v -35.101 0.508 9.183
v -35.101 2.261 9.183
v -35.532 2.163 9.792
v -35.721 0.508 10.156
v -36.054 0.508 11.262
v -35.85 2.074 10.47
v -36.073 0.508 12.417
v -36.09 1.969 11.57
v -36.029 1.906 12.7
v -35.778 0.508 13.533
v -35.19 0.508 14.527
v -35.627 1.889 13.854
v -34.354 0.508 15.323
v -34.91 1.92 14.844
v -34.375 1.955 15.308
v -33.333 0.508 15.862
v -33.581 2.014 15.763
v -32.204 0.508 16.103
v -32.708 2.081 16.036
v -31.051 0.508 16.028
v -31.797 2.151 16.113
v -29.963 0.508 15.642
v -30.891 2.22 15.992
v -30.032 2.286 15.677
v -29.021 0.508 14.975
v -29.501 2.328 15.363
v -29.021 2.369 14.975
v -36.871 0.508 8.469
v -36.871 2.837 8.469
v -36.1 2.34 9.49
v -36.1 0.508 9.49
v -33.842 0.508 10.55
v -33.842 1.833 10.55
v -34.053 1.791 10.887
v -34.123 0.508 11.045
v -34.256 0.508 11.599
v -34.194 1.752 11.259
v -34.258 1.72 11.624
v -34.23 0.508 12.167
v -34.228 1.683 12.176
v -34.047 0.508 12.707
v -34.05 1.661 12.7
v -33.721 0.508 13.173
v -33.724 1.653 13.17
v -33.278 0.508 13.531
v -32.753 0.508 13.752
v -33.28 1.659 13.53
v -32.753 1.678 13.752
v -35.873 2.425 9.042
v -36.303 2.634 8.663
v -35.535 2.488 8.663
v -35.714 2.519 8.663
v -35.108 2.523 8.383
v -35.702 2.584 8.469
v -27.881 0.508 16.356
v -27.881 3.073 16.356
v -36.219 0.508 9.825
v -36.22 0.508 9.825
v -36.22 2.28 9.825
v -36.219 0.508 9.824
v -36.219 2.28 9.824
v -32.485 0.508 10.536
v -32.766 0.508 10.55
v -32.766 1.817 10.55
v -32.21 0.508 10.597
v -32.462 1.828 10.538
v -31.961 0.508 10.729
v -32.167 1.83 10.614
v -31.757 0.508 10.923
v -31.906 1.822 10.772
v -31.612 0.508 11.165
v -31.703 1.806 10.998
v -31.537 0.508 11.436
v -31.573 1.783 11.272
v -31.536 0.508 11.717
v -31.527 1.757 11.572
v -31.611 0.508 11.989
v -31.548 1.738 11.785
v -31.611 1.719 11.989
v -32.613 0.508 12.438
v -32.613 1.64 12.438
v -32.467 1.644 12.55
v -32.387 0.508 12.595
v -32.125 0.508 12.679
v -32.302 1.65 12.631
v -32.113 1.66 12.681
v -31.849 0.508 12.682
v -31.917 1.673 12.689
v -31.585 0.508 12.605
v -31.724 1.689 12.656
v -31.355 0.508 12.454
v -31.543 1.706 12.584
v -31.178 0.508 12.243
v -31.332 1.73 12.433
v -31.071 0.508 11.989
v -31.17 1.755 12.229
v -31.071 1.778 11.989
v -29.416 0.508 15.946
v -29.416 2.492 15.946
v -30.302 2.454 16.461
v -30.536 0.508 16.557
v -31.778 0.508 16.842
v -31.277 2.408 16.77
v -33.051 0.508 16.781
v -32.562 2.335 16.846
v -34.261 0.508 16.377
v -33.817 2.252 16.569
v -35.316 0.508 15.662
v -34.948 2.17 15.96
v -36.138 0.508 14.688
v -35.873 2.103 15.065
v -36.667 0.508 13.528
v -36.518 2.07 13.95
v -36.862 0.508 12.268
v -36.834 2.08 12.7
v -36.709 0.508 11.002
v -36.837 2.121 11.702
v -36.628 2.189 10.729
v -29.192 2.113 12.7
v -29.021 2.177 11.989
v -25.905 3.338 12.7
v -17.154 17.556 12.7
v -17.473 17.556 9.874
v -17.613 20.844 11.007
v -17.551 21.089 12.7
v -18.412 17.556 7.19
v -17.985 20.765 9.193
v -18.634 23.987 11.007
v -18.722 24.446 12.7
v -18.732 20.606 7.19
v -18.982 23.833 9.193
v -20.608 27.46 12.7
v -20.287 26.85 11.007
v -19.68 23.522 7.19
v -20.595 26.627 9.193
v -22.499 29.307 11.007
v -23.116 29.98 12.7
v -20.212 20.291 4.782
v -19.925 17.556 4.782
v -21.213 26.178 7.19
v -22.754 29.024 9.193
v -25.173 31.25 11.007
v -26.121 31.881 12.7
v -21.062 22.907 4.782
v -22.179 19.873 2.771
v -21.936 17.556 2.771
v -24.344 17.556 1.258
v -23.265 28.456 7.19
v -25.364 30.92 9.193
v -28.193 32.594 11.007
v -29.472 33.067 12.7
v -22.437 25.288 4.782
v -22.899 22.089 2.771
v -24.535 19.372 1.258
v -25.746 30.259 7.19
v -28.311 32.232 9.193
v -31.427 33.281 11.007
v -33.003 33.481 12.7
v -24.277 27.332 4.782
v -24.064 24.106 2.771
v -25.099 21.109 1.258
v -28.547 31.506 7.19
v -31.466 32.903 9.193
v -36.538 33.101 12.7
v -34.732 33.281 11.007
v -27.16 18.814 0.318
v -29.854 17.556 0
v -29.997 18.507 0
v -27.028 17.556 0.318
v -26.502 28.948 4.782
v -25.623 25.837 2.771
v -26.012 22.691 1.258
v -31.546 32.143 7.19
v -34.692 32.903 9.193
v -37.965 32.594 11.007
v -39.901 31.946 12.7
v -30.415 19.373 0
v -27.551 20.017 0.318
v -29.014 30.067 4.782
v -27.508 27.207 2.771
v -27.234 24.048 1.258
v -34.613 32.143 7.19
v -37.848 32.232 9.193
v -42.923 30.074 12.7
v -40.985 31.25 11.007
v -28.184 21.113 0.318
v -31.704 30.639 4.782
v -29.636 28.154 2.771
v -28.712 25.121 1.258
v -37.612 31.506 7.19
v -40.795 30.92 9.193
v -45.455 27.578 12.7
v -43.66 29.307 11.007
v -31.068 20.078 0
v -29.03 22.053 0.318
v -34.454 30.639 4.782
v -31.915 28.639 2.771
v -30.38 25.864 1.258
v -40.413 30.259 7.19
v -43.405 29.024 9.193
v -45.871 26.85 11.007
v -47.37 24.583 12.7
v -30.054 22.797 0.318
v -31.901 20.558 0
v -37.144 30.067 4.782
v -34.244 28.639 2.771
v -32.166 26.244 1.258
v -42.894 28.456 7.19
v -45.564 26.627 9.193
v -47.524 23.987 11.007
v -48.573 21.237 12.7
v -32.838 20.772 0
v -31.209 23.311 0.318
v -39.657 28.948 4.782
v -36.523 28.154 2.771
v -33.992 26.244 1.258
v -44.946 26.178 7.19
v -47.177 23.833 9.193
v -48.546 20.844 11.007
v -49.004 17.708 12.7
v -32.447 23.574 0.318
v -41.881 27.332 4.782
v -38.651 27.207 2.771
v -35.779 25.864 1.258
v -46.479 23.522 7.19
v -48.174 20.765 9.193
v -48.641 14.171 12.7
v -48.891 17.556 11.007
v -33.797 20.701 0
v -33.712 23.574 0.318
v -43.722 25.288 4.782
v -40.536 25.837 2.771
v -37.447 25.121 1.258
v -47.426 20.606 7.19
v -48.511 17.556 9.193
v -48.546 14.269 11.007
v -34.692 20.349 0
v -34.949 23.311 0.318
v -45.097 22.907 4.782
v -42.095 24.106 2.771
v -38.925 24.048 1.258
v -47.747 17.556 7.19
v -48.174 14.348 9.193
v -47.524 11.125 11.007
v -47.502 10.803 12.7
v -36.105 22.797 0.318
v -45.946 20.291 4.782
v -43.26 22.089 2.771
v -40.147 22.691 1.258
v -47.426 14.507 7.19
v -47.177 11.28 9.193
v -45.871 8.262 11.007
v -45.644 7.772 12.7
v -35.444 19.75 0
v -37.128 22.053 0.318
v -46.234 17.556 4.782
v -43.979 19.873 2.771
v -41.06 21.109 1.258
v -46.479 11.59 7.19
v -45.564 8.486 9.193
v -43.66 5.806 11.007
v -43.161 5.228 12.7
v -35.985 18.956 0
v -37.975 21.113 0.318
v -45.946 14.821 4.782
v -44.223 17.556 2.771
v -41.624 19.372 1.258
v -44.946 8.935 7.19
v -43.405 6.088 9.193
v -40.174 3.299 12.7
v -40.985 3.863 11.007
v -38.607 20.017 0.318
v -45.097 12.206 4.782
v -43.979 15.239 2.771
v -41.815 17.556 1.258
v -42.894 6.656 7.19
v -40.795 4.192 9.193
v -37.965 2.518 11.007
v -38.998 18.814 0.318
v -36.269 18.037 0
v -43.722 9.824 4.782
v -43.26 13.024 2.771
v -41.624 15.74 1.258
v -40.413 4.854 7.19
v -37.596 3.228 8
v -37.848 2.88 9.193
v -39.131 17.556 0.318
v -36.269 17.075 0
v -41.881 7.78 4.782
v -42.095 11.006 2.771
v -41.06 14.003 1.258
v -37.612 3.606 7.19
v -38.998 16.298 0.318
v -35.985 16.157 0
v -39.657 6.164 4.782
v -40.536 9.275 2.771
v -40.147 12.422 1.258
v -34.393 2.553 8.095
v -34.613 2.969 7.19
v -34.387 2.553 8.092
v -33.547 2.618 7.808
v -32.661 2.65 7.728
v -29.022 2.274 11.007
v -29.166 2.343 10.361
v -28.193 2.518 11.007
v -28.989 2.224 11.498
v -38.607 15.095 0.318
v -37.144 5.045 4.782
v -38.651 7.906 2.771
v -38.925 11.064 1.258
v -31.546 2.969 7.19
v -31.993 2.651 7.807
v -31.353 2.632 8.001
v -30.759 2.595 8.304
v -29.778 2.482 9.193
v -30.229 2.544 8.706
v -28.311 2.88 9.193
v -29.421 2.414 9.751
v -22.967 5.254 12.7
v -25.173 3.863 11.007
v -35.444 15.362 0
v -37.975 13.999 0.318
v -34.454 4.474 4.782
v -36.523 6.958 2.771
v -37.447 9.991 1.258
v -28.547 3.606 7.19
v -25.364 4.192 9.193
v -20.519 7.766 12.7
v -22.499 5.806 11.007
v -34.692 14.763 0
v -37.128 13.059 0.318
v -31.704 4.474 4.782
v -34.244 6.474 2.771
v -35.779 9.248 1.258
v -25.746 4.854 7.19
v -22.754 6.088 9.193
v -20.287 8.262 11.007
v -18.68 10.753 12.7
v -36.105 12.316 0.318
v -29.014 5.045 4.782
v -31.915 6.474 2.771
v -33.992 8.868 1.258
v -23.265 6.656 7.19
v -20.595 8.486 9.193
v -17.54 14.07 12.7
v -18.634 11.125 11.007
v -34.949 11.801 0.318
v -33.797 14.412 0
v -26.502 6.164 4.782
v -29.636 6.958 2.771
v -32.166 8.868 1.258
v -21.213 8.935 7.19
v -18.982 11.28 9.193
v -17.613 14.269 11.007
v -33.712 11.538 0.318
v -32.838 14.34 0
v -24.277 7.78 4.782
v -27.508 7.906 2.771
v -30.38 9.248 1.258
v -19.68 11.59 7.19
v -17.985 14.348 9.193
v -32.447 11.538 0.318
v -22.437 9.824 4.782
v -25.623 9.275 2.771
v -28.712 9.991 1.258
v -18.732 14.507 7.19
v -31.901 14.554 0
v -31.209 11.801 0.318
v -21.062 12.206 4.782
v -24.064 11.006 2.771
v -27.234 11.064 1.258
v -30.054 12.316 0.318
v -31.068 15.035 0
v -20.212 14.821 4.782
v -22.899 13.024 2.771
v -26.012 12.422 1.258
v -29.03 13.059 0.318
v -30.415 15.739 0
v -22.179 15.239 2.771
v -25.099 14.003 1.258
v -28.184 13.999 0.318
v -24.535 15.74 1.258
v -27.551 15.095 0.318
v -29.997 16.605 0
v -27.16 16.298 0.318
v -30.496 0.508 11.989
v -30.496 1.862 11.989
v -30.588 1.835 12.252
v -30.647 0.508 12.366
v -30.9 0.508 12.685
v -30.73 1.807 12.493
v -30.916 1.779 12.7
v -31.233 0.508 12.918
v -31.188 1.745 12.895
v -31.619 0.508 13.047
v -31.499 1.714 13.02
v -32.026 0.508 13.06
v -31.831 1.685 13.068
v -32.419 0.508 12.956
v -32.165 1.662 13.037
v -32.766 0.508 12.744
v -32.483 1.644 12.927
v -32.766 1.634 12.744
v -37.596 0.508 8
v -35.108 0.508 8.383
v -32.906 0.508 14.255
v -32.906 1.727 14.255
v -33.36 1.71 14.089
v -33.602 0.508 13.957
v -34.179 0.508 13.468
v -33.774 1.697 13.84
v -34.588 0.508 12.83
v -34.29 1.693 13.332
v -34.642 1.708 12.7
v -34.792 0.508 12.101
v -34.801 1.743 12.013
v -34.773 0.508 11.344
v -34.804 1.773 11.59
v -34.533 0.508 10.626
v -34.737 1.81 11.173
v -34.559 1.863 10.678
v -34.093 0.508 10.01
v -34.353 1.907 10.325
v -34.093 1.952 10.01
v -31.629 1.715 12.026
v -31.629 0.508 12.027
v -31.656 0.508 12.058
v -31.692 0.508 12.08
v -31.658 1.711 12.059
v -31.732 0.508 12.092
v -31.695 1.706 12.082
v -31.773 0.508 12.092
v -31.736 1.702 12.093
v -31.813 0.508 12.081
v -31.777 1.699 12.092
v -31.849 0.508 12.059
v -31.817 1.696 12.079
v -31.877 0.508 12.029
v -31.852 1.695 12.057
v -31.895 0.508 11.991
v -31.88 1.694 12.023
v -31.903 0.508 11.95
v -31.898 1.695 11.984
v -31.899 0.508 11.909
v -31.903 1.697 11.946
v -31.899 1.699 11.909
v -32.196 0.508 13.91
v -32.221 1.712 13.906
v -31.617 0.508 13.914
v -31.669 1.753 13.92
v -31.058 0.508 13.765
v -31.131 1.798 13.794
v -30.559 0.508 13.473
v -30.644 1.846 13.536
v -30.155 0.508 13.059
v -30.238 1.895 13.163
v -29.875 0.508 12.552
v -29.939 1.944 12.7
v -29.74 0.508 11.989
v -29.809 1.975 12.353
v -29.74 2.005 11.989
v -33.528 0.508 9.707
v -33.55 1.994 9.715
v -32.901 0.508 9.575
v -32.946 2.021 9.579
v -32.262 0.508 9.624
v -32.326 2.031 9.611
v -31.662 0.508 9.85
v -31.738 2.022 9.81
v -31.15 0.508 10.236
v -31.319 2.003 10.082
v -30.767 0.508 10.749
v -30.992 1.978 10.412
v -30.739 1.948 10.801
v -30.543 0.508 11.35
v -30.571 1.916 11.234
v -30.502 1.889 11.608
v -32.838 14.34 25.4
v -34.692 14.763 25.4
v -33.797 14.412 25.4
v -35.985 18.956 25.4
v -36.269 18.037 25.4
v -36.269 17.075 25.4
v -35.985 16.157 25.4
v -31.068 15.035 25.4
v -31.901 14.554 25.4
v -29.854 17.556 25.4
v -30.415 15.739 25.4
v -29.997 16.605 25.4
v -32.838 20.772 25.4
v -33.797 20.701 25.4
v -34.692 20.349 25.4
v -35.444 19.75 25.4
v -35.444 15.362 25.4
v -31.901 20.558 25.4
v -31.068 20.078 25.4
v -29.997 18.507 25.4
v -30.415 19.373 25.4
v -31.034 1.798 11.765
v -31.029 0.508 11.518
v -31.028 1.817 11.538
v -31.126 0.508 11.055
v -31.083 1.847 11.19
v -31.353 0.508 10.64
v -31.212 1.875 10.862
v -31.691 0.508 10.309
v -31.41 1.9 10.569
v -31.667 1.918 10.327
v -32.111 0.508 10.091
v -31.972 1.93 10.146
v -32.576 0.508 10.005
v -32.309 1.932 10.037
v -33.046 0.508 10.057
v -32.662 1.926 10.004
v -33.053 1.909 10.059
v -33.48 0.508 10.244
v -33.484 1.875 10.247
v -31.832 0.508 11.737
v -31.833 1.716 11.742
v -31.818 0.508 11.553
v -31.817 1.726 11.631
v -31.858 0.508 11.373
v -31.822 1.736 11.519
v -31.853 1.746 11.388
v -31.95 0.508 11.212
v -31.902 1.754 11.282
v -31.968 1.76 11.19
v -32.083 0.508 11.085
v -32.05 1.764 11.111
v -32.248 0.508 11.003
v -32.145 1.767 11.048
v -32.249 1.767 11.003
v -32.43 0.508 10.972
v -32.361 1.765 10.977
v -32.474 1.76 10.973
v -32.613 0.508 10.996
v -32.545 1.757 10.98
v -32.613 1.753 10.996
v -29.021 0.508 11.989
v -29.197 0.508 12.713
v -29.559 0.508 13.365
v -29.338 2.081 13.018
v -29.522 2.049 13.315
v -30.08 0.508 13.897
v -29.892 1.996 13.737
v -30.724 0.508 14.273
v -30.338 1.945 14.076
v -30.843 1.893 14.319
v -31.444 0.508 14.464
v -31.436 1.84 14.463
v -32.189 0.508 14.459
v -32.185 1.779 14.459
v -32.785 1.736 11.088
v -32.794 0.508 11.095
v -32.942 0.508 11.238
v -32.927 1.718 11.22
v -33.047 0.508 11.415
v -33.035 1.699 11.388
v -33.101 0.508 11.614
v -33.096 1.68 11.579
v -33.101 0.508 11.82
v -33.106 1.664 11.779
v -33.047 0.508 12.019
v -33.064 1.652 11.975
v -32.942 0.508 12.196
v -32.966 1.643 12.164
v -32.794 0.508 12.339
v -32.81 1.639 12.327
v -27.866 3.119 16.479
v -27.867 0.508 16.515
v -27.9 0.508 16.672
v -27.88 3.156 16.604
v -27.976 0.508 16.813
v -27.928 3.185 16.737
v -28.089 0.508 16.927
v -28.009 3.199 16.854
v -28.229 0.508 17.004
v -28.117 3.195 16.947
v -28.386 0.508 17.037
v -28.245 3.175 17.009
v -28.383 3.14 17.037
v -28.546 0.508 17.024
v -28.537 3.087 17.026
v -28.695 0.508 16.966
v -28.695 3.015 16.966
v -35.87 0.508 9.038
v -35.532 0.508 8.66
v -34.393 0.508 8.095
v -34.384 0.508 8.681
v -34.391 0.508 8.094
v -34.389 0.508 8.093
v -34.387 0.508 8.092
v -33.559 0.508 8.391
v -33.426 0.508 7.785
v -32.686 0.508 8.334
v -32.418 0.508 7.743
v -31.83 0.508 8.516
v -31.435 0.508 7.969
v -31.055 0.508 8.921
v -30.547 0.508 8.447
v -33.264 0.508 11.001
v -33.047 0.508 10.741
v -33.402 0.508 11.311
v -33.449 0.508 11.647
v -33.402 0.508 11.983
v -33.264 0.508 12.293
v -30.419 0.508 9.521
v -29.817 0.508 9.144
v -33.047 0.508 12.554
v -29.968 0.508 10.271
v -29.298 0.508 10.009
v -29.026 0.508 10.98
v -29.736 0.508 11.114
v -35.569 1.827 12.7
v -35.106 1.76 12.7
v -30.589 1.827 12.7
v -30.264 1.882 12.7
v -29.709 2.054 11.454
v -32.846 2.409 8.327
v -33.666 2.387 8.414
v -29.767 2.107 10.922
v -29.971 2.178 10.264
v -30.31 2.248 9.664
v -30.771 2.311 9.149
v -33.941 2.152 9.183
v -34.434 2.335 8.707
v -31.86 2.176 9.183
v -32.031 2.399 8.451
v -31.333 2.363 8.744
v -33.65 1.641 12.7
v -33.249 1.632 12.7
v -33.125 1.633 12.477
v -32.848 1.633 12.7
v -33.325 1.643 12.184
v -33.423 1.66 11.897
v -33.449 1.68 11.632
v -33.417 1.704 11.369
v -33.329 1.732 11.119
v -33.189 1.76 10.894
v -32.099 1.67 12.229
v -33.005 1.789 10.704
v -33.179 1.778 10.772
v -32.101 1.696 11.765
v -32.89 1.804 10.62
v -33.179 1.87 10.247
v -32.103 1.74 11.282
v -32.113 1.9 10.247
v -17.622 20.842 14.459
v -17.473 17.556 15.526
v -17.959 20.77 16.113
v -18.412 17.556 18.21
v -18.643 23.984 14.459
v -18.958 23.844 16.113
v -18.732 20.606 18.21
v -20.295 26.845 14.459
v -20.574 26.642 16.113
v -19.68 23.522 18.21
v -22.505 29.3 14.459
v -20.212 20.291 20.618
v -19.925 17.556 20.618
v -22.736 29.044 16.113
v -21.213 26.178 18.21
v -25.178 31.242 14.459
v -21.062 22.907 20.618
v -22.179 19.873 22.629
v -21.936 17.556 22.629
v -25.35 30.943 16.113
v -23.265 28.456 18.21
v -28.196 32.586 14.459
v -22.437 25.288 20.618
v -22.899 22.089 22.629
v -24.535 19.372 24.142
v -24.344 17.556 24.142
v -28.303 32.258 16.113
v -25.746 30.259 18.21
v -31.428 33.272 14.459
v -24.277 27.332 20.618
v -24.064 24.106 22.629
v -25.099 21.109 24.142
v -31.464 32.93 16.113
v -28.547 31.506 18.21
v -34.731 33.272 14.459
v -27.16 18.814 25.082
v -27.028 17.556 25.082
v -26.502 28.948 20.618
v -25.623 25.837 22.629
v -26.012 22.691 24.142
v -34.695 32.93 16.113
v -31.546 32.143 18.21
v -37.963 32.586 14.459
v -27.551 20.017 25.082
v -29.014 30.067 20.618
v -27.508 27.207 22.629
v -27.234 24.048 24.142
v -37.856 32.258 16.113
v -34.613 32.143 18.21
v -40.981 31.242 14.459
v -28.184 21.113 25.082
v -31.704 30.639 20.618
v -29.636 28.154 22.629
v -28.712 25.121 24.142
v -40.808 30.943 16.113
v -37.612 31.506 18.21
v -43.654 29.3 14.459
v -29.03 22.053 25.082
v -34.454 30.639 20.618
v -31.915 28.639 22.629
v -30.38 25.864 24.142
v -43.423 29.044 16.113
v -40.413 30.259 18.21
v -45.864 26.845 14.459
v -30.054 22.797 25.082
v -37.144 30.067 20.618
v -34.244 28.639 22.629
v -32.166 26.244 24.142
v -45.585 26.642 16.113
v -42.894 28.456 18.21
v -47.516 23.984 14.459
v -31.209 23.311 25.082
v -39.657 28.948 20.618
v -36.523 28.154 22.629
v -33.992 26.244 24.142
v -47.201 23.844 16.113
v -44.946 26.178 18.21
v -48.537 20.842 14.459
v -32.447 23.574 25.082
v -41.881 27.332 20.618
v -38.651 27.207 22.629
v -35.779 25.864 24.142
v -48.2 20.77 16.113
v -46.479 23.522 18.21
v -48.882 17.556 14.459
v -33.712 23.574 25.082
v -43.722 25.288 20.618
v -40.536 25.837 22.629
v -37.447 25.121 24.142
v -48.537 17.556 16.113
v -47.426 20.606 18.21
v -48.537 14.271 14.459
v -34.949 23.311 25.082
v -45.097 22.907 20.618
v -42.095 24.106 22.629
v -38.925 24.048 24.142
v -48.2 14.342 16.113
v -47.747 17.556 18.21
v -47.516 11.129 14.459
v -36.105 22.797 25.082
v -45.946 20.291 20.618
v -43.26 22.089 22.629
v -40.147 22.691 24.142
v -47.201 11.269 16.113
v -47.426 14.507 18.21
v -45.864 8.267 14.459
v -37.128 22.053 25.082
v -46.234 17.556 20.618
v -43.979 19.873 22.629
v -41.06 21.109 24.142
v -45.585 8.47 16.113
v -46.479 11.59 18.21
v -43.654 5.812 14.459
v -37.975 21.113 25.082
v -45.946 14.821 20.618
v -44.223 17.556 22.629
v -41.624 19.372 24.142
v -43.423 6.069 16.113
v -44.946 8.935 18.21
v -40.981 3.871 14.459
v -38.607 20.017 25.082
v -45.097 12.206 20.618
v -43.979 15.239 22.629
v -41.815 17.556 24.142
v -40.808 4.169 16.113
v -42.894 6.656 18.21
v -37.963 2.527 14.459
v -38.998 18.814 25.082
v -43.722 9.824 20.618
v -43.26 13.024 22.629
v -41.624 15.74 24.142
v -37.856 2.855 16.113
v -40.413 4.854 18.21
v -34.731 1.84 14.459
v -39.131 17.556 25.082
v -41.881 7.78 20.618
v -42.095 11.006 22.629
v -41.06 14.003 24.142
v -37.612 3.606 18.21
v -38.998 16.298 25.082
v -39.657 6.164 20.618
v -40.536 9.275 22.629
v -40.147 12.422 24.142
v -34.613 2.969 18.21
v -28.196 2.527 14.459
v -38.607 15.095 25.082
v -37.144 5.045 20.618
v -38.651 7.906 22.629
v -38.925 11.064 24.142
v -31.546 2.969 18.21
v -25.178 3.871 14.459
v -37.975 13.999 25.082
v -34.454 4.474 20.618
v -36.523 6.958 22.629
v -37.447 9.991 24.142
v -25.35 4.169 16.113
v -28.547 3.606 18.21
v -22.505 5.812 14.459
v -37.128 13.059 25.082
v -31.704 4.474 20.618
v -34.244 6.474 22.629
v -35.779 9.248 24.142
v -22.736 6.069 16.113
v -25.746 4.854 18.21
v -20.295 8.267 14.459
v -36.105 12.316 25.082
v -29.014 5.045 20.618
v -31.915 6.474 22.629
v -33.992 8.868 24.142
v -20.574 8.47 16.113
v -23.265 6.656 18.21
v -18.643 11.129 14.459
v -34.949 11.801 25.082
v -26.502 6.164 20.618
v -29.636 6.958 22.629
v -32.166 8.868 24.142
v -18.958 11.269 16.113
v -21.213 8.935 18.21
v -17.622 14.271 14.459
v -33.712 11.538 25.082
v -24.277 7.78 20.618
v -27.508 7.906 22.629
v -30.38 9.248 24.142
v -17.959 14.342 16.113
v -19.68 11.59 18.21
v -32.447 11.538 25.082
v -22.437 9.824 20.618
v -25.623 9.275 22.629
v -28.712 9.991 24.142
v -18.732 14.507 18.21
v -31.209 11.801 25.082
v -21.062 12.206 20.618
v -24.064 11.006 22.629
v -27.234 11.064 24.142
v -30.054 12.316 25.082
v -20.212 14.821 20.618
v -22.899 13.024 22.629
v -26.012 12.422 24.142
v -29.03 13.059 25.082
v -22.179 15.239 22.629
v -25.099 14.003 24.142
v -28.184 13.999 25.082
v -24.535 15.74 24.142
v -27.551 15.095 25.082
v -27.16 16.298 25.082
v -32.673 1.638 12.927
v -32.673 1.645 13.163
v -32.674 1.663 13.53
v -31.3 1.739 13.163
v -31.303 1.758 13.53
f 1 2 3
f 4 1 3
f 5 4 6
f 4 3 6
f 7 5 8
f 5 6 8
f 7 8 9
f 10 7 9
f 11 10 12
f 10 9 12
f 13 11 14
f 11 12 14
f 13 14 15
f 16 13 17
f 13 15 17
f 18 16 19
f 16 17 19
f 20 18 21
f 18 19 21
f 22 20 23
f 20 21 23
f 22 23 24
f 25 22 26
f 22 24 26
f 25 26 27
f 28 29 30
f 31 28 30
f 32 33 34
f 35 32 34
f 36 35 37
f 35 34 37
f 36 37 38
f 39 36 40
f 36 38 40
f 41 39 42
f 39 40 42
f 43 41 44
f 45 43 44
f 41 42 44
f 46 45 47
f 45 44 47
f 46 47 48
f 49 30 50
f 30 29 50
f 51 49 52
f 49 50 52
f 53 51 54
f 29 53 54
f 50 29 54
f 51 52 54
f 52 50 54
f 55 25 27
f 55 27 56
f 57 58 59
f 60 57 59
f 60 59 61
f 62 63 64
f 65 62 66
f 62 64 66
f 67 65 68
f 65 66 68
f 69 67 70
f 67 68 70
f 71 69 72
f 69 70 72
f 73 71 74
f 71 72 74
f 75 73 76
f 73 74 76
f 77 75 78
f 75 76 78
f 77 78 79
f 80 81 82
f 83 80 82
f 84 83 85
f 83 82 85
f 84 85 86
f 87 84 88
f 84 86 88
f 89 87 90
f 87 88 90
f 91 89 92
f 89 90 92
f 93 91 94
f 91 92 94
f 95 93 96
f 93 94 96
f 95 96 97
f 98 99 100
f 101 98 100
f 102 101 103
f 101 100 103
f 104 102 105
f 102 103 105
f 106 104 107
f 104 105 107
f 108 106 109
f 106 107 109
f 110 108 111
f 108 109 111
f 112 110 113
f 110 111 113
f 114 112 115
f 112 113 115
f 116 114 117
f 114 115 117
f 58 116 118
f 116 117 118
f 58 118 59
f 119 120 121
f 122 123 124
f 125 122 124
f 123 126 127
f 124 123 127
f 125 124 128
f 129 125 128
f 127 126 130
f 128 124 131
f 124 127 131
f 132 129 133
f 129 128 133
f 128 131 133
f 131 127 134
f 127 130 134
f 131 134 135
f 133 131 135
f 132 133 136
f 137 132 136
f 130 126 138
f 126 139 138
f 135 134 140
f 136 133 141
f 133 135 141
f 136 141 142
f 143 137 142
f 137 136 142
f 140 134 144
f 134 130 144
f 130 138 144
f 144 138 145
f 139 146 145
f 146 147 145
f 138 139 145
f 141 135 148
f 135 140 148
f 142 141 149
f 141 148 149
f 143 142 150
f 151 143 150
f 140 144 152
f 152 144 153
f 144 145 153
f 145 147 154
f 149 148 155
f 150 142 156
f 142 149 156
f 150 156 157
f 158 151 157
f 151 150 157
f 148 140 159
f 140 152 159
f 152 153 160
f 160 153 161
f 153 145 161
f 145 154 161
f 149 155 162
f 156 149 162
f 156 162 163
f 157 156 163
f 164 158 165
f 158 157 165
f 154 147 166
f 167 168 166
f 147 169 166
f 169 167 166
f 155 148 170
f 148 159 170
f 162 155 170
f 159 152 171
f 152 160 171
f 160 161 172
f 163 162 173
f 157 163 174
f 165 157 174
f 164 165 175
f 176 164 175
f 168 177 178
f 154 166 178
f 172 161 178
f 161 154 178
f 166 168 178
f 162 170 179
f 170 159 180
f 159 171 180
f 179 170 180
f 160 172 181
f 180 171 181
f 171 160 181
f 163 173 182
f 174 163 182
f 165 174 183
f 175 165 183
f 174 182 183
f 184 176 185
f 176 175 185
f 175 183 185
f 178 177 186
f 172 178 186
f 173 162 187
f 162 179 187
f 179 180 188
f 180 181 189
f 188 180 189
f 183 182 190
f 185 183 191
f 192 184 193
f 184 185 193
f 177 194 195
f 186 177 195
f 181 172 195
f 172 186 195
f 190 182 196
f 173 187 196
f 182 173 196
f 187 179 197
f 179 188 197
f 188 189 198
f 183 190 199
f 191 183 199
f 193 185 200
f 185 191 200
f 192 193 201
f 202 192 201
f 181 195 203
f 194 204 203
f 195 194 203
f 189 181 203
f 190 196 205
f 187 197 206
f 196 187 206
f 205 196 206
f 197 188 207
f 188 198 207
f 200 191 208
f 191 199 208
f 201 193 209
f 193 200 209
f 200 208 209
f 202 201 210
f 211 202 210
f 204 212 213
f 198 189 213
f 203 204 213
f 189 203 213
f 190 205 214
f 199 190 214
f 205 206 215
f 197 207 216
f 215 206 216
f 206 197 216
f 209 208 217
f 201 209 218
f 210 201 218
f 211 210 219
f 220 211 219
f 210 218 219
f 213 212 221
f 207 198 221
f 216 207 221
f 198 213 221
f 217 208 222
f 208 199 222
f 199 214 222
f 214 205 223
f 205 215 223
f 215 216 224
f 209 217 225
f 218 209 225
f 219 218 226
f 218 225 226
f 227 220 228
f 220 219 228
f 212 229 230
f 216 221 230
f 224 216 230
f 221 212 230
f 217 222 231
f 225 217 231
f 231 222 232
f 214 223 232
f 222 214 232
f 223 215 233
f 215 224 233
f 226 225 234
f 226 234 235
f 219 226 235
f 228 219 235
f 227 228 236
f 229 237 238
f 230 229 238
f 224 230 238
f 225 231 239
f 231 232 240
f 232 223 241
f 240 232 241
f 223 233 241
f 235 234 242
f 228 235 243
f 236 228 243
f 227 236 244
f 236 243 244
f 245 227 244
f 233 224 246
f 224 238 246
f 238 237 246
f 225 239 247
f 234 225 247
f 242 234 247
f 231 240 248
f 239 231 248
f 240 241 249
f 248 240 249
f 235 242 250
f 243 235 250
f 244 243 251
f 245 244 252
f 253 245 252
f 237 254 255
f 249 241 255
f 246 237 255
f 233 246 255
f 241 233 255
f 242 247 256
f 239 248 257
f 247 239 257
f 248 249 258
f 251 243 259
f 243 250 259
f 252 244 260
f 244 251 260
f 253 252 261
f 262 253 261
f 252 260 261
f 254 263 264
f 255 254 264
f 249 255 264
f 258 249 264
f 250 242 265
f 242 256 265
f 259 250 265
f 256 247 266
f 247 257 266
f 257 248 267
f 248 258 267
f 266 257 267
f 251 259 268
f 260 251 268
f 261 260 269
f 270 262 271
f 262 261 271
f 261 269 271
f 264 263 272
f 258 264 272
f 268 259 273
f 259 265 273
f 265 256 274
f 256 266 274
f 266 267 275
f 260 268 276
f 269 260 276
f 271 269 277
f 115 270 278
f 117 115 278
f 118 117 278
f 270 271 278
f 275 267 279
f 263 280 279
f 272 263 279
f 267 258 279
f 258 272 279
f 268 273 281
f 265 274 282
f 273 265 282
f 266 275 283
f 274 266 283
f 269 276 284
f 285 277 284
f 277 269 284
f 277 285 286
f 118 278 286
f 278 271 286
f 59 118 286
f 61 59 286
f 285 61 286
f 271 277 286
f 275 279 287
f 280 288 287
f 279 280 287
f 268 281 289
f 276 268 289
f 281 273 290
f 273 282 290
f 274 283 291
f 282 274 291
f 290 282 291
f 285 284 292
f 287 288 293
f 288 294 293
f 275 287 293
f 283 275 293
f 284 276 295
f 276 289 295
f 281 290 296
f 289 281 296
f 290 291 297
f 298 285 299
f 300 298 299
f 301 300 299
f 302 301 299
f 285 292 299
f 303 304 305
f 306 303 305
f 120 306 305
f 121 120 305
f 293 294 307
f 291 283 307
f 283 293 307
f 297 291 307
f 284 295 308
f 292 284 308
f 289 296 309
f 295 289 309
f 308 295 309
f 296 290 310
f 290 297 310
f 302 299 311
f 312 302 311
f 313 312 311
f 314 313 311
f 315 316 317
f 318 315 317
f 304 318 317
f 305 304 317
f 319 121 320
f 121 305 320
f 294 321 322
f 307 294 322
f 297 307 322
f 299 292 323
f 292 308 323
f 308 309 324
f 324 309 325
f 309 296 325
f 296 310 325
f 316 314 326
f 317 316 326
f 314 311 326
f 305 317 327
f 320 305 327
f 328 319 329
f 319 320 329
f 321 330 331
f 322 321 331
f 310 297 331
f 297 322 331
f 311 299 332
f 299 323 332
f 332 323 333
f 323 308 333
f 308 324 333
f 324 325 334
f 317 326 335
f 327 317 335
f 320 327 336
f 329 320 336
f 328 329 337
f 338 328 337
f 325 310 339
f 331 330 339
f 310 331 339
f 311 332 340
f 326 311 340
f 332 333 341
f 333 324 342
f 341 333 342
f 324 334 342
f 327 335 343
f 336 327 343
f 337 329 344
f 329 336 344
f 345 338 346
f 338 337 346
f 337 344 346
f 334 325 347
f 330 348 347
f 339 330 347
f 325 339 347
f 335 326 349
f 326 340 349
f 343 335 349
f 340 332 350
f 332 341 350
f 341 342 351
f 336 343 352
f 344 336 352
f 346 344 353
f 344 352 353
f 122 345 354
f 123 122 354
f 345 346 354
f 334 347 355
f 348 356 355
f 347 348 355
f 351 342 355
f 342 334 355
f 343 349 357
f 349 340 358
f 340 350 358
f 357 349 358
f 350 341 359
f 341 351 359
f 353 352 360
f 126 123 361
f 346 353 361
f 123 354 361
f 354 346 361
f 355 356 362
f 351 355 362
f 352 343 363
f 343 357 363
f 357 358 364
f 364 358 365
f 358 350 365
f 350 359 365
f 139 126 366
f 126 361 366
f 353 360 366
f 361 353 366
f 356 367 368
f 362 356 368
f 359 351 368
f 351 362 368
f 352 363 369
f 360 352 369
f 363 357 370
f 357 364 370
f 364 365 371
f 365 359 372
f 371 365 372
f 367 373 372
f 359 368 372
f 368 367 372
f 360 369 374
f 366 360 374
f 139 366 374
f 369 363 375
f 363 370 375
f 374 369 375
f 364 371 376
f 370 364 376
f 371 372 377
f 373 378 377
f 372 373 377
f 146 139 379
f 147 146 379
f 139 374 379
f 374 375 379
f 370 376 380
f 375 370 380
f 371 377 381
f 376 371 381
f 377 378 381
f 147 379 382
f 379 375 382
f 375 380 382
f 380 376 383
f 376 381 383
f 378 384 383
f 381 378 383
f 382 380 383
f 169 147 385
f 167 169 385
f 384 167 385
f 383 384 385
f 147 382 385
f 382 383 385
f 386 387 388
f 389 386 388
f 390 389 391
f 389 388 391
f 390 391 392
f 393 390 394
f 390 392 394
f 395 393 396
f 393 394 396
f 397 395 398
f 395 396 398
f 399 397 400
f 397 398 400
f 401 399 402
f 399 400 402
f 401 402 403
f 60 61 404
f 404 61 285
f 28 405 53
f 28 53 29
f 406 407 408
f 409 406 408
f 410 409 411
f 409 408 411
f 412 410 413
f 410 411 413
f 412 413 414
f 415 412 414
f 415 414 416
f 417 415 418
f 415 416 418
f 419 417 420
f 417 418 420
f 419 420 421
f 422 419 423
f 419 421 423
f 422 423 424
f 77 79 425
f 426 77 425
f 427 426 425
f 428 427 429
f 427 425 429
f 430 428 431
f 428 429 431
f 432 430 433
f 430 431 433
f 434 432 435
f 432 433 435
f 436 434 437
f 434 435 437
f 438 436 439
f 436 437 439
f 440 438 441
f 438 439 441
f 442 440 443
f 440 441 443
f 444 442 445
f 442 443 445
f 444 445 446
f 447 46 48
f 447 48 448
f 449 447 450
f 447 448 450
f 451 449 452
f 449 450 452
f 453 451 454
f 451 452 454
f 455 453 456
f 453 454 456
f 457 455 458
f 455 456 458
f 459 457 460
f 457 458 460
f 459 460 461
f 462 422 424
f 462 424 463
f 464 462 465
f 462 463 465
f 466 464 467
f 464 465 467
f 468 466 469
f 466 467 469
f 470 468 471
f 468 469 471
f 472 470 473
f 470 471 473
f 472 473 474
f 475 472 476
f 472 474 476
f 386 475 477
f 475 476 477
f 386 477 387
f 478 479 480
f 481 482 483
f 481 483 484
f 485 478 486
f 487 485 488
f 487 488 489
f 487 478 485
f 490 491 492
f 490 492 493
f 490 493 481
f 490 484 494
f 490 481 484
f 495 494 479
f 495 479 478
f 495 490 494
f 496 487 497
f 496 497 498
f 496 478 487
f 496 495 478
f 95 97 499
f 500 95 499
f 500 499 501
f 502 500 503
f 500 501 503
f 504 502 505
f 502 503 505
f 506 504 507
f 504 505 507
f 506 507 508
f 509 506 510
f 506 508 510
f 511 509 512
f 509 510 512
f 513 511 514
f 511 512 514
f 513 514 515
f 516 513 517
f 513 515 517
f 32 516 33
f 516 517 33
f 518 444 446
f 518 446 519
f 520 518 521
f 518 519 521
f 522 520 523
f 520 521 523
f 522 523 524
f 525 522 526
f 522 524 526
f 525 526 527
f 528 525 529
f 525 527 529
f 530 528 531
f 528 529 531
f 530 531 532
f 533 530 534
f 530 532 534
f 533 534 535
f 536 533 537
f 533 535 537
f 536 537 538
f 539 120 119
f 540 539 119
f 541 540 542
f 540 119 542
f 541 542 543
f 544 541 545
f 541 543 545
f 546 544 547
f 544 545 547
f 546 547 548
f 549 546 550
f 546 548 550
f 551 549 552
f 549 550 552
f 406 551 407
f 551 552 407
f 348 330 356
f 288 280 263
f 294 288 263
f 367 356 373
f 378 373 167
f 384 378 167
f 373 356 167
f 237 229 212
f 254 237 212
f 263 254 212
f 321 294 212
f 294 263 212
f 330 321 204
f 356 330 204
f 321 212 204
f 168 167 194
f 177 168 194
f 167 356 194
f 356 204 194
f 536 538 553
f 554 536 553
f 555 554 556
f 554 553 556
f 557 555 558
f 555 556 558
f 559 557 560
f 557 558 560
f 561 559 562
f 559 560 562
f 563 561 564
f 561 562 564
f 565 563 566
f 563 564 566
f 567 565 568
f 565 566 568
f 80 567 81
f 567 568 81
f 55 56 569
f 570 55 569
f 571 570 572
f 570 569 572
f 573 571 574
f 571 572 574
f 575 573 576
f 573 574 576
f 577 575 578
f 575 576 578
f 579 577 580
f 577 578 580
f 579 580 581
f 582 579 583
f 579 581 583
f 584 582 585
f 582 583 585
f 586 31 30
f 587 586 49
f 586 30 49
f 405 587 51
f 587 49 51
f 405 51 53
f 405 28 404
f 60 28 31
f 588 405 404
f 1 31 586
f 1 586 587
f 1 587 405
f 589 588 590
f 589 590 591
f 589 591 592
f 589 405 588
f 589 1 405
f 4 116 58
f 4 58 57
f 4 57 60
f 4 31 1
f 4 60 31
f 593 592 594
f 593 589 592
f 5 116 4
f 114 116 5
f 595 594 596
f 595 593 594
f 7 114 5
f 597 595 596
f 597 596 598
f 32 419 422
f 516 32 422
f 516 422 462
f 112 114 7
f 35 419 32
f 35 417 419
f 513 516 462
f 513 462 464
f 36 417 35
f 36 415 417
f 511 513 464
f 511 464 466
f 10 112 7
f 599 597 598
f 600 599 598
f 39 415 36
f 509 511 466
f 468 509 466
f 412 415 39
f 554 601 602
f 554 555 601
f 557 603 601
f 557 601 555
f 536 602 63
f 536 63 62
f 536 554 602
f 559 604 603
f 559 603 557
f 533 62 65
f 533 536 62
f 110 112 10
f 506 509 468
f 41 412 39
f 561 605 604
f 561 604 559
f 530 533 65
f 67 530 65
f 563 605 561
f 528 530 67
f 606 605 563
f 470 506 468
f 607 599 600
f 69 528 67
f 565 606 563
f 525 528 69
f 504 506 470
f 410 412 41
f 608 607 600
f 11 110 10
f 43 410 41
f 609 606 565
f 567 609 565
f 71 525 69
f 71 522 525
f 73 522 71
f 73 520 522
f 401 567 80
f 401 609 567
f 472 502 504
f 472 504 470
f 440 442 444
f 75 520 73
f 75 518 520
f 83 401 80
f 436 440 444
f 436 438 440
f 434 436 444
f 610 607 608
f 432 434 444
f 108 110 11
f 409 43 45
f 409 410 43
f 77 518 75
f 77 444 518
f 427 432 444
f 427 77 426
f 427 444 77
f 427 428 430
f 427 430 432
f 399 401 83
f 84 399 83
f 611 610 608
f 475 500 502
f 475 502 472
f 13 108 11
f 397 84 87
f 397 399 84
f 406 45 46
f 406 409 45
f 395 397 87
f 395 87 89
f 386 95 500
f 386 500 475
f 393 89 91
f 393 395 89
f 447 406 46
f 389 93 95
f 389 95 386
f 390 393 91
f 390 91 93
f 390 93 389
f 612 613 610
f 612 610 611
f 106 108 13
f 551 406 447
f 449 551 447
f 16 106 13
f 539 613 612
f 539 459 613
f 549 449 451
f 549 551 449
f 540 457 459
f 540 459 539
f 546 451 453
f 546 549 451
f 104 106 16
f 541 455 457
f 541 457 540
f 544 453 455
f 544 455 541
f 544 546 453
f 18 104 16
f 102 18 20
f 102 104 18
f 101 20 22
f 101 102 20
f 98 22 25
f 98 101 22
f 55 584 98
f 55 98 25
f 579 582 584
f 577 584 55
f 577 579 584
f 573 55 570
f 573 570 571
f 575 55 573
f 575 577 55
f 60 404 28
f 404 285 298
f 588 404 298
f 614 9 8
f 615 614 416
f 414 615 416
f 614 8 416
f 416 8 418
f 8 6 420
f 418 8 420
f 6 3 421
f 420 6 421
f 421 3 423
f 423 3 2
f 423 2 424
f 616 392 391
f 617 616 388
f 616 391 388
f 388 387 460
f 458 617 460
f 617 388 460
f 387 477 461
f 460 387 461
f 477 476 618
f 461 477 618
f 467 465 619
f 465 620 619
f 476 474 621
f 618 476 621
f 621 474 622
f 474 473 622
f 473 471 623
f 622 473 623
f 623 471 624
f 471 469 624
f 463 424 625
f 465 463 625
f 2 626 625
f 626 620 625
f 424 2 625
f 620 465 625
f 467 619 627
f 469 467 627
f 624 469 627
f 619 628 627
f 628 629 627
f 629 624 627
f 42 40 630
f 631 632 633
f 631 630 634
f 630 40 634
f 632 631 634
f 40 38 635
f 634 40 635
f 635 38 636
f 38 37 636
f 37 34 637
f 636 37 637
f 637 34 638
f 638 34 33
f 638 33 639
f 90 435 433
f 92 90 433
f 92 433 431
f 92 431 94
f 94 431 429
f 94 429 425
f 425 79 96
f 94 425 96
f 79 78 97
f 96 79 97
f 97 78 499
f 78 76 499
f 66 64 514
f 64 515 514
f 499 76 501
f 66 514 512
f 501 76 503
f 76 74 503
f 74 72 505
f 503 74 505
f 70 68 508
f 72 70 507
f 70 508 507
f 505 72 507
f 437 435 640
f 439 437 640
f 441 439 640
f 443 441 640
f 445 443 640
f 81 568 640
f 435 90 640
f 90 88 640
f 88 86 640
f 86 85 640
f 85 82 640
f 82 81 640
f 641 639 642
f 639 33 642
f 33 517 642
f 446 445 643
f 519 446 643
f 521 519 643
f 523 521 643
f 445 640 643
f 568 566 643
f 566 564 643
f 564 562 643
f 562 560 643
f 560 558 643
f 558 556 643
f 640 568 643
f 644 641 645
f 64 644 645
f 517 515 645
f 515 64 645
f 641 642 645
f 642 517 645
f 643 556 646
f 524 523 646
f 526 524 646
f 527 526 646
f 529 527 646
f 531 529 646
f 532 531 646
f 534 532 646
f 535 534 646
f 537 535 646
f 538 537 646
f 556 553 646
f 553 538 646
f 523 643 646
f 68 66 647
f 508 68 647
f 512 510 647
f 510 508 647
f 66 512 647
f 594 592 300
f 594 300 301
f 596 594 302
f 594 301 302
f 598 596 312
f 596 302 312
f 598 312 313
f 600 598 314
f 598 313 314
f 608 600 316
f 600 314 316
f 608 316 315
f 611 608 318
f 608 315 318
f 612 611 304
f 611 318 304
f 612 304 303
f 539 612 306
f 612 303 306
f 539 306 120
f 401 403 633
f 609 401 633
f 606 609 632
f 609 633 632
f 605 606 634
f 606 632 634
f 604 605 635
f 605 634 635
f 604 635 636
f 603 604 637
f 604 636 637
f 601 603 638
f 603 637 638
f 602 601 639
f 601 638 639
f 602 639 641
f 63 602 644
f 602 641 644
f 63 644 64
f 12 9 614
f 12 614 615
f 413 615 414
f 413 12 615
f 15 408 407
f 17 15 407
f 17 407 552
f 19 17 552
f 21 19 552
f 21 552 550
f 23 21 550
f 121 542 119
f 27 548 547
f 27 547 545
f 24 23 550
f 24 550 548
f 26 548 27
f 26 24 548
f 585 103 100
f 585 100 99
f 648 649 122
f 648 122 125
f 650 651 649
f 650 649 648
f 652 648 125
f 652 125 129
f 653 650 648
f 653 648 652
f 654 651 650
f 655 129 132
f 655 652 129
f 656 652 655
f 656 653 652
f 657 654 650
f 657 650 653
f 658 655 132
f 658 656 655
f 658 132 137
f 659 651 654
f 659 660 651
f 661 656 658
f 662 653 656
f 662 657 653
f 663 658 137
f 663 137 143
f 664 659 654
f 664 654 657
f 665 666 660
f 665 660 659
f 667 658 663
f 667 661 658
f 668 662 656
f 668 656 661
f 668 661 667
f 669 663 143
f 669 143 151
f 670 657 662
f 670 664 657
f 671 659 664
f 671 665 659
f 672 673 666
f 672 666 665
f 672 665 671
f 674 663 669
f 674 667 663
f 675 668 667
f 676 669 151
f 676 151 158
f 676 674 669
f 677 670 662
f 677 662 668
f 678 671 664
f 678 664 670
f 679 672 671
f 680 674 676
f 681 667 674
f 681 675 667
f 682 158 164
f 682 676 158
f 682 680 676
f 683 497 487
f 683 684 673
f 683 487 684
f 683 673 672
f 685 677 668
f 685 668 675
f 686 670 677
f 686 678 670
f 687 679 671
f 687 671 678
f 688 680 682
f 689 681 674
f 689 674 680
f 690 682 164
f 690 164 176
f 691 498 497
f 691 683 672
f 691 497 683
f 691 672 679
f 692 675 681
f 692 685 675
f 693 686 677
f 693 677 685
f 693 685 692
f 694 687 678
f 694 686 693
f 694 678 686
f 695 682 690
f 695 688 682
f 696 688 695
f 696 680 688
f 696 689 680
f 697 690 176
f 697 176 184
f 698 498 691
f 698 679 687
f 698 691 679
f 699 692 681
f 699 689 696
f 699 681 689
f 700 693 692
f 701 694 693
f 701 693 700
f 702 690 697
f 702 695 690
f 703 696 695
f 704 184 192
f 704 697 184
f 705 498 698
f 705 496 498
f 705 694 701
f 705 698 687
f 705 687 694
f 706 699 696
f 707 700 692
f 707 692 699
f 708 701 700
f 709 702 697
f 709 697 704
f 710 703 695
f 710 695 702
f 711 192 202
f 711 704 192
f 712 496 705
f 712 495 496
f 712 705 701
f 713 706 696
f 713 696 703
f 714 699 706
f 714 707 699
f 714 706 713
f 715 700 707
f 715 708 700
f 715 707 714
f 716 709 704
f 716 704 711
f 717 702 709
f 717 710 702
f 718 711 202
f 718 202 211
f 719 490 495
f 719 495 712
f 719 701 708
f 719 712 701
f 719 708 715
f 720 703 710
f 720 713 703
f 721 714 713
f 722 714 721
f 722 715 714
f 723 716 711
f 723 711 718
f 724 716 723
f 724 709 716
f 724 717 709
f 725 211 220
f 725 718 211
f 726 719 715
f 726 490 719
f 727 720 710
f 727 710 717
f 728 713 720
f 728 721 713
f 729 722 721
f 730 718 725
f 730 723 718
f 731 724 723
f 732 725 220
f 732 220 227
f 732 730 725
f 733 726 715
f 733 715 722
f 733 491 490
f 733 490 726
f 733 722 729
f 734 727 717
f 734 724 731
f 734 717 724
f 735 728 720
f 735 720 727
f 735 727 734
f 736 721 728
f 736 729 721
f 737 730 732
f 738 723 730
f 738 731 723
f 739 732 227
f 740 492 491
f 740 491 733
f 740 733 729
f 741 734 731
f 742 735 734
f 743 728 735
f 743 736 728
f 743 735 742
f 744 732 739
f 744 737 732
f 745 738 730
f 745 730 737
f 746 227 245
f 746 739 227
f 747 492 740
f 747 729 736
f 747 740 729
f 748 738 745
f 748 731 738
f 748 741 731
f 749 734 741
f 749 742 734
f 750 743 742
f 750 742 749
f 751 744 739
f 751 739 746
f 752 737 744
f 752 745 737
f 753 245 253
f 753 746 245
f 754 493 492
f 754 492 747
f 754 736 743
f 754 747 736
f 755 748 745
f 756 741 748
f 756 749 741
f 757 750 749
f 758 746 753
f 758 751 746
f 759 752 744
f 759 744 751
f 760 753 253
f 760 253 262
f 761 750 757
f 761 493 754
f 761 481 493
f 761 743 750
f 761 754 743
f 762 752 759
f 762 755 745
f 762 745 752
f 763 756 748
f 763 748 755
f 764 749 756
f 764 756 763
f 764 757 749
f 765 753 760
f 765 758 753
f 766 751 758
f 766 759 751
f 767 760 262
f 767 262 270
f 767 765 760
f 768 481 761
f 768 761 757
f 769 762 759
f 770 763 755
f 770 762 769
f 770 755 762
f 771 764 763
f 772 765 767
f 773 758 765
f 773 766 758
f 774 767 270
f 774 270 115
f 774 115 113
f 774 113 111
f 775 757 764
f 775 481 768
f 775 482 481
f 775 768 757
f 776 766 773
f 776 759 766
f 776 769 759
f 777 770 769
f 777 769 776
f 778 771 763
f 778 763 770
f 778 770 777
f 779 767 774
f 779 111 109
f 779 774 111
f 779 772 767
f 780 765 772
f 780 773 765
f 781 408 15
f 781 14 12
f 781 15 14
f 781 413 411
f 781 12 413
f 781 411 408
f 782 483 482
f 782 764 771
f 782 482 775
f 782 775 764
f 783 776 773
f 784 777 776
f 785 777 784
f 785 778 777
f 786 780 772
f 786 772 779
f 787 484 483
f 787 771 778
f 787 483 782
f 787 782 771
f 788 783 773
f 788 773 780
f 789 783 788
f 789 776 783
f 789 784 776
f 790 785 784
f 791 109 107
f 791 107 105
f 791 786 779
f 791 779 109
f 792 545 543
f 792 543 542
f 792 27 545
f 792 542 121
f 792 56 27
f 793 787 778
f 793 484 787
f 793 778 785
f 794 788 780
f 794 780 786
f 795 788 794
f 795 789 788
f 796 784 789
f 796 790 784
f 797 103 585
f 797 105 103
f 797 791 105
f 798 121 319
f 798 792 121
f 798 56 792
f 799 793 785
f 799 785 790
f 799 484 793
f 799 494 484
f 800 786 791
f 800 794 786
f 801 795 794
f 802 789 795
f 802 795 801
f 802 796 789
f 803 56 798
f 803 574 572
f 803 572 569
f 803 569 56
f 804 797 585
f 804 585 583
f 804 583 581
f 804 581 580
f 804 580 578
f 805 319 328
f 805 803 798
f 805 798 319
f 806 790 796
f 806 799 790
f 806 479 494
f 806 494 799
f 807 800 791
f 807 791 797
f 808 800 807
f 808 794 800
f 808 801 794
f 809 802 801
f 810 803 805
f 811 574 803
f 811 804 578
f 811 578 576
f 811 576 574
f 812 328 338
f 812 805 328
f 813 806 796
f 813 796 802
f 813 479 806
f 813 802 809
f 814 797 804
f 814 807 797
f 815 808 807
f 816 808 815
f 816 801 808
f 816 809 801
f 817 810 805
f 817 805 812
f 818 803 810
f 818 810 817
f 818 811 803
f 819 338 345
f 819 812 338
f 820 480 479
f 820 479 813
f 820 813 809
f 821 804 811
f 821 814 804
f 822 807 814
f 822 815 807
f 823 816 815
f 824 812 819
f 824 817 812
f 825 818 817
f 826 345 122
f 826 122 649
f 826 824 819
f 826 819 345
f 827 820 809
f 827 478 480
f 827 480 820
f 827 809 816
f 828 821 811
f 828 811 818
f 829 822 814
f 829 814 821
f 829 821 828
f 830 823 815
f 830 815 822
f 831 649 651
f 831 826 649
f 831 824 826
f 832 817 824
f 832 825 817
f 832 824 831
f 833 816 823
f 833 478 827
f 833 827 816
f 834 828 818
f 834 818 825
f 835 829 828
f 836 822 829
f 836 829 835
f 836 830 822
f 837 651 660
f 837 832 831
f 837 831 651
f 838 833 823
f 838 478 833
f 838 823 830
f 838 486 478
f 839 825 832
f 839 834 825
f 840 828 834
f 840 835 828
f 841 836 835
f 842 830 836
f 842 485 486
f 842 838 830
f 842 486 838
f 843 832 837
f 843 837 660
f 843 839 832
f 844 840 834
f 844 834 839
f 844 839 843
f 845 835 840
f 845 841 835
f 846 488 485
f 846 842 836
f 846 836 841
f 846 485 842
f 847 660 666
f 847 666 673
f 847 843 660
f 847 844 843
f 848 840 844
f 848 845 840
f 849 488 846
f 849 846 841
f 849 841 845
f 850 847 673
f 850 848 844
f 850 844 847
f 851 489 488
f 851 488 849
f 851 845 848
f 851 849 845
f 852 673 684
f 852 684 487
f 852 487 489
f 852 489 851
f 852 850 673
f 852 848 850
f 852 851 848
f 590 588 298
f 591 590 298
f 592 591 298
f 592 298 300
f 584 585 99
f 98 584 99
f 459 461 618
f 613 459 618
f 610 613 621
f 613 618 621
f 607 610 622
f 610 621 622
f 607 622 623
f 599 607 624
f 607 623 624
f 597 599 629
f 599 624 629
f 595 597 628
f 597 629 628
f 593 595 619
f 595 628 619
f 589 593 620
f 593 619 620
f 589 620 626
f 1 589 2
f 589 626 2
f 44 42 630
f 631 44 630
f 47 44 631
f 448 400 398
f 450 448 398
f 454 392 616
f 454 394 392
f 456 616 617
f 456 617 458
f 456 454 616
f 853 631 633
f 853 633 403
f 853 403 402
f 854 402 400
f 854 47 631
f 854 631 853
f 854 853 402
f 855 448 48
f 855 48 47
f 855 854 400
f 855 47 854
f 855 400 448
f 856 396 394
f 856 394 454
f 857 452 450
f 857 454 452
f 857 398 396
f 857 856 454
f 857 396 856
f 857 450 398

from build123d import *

# Parameters (mm, degrees)
F0_R     = 15.9252412
F1_DEPTH = 25.4
F2_R     = 12.69999
F5_DEPTH = 3.81


# Not quite as in the source:
# - a fillet or chamfer is up to 0.001 mm smaller than in the source, because OpenCascade refuses the exact size


with BuildPart() as f1:
    # F0 (on Top) → F1 (new body)
    with BuildSketch(Plane.XY):
        with Locations((-33.0793492307, 17.5561513754)):
            Circle(F0_R)
    extrude(amount=F1_DEPTH)

    # F2 (radius 12.7 in the source; OpenCascade refuses exactly that, so slightly less here)
    f2_edges = [f1.edges().sort_by_distance(p)[0] for p in [
        (-49.00459, 17.556151, 25.4),
        (-49.00459, 17.556151, 0),
    ]]
    fillet(f2_edges, radius=F2_R)

    # F4 (on offset) → F5 (join)
    with BuildSketch(Plane.XZ.offset(-4.318)):
        with BuildLine():
            Line((-29.0207639337, 14.9749675766), (-27.8811603785, 16.3556560874))
            ThreePointArc((-27.8811603785, 16.3556560874), (-28.0885315249, 16.9271168776), (-28.695197776, 16.9661846012))
            Line((-28.695197776, 16.9661846012), (-29.4164977968, 15.9463118762))
            ThreePointArc((-29.4164977968, 15.9463118762), (-35.315728181, 15.6618586245), (-36.2196562996, 9.8253573836))
            ThreePointArc((-36.2196562996, 9.8253573836), (-36.219121003, 9.824445743), (-36.2185855, 9.8235342236))
            Line((-36.2185855, 9.8235342236), (-37.5962145627, 8.0000562593))
            Line((-37.5962145627, 8.0000562593), (-34.392606223, 8.0947948317))
            ThreePointArc((-34.392606223, 8.0947948317), (-34.3897808352, 8.0934481012), (-34.3869543323, 8.0921037126))
            ThreePointArc((-34.3869543323, 8.0921037126), (-30.5469478577, 8.4474204279), (-29.0207639337, 11.9889825583))
            ThreePointArc((-29.0207639337, 11.9889825583), (-30.3891986708, 14.106652787), (-32.9061411321, 14.2554529011))
            ThreePointArc((-32.9061411321, 14.2554529011), (-34.717169495, 12.4733526926), (-34.0933389962, 10.0103178993))
            ThreePointArc((-34.0933389962, 10.0103178993), (-31.6624363369, 9.8503464108), (-30.4957684129, 11.9889825583))
            ThreePointArc((-30.4957684129, 11.9889825583), (-31.4214059538, 12.9964876797), (-32.7661586101, 12.7444723621))
            ThreePointArc((-32.7661586101, 12.7444723621), (-33.4490909653, 11.6472132504), (-32.7661586101, 10.5499541387))
            ThreePointArc((-32.7661586101, 10.5499541387), (-31.7571819842, 10.9231691425), (-31.6110141575, 11.9889825583))
            ThreePointArc((-31.6110141575, 11.9889825583), (-31.7935886004, 12.08811911), (-31.8988275295, 11.9089927555))
            ThreePointArc((-31.8988275295, 11.9089927555), (-31.9495376202, 11.212409195), (-32.6134748757, 10.9956432134))
            ThreePointArc((-32.6134748757, 10.9956432134), (-33.1081520423, 11.7169185542), (-32.6134748757, 12.4381938949))
            ThreePointArc((-32.6134748757, 12.4381938949), (-31.714287938, 12.6534772255), (-31.0713797808, 11.9889825583))
            ThreePointArc((-31.0713797808, 11.9889825583), (-31.8928919194, 10.1846295294), (-33.841509372, 10.5499541387))
            ThreePointArc((-33.841509372, 10.5499541387), (-34.1573684854, 12.4434120609), (-32.7527012902, 13.7517927215))
            ThreePointArc((-32.7527012902, 13.7517927215), (-30.7985222002, 13.6359080863), (-29.7402776778, 11.9889825583))
            ThreePointArc((-29.7402776778, 11.9889825583), (-31.4290089637, 8.6919853613), (-35.1006612182, 9.182875976))
            ThreePointArc((-35.1006612182, 9.182875976), (-34.7993943786, 14.9536870948), (-29.0207639337, 14.9749675766))
        make_face()
        with BuildLine():
            Line((-36.8709181573, 8.4690021479), (-36.0997095704, 9.489800781))
            ThreePointArc((-36.0997095704, 9.489800781), (-35.713386033, 8.8381304316), (-35.107601434, 8.383218199))
            Line((-35.107601434, 8.383218199), (-36.8709181573, 8.4690021479))
        make_face(mode=Mode.SUBTRACT)
    extrude(amount=F5_DEPTH)


solid = f1.part
